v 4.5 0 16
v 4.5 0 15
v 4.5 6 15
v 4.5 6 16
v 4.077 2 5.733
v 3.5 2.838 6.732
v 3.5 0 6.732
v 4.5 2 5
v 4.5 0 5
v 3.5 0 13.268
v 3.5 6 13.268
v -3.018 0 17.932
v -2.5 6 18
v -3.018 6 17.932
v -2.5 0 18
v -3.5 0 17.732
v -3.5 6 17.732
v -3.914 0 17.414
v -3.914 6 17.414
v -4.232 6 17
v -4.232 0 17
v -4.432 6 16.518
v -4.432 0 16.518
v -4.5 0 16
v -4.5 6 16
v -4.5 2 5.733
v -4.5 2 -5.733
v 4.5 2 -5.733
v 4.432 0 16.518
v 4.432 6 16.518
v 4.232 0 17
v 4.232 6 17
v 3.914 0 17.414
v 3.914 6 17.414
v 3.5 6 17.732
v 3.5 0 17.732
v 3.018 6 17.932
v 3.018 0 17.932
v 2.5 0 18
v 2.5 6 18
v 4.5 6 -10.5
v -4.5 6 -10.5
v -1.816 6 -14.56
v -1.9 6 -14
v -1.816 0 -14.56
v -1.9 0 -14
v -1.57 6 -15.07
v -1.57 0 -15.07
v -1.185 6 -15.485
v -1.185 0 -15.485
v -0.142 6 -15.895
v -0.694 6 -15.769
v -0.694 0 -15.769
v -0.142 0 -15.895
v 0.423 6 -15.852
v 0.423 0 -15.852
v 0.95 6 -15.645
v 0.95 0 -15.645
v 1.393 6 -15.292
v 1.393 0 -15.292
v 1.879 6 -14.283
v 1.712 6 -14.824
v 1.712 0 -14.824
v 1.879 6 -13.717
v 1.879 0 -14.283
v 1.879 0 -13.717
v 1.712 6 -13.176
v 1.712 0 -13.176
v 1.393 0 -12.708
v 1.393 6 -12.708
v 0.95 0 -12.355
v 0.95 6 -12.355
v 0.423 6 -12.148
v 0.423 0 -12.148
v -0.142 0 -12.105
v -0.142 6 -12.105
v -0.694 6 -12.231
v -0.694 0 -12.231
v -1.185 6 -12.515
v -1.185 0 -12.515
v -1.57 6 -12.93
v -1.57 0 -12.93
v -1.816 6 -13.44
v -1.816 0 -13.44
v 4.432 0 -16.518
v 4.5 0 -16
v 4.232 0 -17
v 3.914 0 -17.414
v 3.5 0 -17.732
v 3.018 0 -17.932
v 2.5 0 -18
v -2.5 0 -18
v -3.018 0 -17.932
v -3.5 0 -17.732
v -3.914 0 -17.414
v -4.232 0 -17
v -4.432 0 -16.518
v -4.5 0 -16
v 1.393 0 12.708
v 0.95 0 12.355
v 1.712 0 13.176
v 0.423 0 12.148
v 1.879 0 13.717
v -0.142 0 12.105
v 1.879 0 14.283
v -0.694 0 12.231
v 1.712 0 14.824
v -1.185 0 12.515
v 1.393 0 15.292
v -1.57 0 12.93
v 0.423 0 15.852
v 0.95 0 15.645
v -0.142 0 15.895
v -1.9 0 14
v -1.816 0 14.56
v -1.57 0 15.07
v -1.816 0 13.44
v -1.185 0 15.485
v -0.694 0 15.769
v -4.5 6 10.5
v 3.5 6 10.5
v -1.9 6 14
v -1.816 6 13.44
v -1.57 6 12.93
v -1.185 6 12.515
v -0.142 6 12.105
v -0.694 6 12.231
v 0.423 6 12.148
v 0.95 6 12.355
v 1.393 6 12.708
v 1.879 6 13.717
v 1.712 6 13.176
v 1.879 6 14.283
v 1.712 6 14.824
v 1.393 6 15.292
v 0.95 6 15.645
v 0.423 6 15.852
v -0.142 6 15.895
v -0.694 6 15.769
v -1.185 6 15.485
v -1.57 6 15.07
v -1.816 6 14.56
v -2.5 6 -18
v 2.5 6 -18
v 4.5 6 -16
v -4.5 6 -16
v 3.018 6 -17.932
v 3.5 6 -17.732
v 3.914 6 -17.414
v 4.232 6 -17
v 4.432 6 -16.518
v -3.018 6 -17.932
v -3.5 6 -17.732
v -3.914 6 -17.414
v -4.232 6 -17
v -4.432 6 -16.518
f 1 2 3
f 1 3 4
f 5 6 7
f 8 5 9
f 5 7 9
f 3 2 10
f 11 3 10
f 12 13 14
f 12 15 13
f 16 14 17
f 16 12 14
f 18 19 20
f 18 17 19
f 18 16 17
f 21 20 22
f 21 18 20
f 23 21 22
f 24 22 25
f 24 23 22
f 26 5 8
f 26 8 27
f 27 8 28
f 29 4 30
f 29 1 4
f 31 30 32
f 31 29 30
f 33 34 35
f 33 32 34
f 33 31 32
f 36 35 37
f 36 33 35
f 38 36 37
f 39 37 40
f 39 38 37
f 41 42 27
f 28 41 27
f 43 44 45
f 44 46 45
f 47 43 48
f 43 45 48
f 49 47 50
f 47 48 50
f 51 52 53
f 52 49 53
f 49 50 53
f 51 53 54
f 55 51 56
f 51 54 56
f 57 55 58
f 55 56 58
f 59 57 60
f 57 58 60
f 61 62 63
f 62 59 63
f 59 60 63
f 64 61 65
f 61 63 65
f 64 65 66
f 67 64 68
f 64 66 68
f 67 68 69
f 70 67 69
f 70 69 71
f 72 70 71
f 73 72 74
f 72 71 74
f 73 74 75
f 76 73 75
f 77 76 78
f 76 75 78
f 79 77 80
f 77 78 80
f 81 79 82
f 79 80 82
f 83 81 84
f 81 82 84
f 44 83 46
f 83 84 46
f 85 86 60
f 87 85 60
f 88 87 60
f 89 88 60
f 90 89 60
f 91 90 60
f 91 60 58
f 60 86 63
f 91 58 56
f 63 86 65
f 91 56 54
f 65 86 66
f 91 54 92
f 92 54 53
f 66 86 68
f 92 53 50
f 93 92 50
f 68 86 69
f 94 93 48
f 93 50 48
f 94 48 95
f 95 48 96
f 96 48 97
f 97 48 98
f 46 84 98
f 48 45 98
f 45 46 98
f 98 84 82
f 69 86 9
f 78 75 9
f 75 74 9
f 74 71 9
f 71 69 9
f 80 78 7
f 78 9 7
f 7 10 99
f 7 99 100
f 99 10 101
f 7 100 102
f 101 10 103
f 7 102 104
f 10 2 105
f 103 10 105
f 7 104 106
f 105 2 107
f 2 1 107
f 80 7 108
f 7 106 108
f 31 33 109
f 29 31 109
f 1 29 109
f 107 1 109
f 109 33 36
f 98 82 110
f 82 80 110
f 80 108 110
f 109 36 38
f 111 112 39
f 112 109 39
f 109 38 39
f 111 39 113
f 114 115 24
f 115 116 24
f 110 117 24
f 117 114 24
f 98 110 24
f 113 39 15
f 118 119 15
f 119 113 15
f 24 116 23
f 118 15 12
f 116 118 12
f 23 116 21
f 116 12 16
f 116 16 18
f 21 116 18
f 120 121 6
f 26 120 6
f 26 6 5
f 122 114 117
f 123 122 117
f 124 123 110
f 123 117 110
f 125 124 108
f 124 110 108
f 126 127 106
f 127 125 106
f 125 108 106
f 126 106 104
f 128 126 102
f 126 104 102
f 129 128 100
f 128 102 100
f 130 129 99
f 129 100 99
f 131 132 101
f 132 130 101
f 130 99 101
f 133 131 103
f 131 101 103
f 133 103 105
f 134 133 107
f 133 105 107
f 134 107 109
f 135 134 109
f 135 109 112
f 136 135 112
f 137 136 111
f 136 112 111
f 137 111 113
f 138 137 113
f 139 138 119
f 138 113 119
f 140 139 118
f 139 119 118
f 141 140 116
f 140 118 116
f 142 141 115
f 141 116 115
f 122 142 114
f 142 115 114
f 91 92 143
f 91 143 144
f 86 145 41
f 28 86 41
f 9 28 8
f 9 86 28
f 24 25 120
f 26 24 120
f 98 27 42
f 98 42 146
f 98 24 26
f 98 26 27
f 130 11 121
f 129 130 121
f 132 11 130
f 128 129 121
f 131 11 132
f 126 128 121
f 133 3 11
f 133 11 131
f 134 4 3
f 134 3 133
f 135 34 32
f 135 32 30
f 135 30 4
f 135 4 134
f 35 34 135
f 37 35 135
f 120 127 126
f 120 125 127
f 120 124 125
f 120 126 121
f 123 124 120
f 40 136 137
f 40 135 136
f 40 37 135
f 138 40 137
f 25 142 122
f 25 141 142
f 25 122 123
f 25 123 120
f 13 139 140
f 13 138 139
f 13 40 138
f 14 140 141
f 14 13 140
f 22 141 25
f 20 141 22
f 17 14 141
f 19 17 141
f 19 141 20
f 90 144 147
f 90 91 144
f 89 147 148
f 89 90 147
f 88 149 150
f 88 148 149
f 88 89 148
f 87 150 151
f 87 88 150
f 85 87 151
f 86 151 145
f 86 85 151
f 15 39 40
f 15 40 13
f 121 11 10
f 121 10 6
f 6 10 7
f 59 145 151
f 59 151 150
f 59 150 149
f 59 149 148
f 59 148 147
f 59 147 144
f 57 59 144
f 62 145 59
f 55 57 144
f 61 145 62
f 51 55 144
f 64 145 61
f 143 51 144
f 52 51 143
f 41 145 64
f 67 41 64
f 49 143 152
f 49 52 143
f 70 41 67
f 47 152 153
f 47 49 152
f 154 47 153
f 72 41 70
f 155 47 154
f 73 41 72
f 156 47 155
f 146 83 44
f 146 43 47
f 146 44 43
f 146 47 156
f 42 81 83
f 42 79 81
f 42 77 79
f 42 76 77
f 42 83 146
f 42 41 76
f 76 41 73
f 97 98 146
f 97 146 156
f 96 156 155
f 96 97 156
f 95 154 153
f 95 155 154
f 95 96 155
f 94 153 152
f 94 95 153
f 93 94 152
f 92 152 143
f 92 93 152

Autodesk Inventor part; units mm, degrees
ref_plane "YZ Plane" through (0, 0, 0) normal (1, 0, 0) x (0, 1, 0)
ref_plane "XZ Plane" through (0, 0, 0) normal (0, 1, 0) x (-1, 0, 0)
ref_plane "XY Plane" through (0, 0, 0) normal (0, 0, 1) x (1, 0, 0)
sketch "Sketch1" plane through (0, 0, 0) normal (0, 1, 0) x (-1, 0, 0)
  line L0 (-2.5, 18) -> (2.5, 18)
  line L1 (4.5, 16) -> (4.5, -16)
  line L2 (2.5, -18) -> (-2.5, -18)
  line L3 (-4.5, -16) -> (-4.5, 16)
  line L4 (-4.5, 18) -> (4.5, -18) construction
  line L5 (4.5, 18) -> (-4.5, -18) construction
  circle A0 centre (0, 14) radius 1.9
  line L6 (0, 14) -> (0, -14) construction
  circle A1 centre (0, -14) radius 1.9
  arc A2 (4.5, 16) -> (2.5, 18) centre (2.5, 16) ccw
  arc A3 (2.5, -18) -> (4.5, -16) centre (2.5, -16) ccw
  arc A4 (-4.5, -16) -> (-2.5, -18) centre (-2.5, -16) ccw
  arc A5 (-2.5, 18) -> (-4.5, 16) centre (-2.5, 16) ccw
  point P0 (0, 0)
  point P1 (0, 0)
  dimension "d0" = 3.8
  dimension "d1" = 28
  dimension "d2" = 36
  dimension "d3" = 9
  dimension "d4" = 2
  dimension "d5" = 2
  dimension "d6" = 2
extrude "Extrusion1" add sketch "Sketch1" along normal blind 6
sketch "Sketch2" plane through (4.5, 0, 16) normal (1, 0, 0) x (0, 0, -1)
  line L0 (32, 6) -> (0, 6) construction
  line L1 (5.5, 6) -> (10.267, 2)
  line L2 (10.267, 2) -> (16, 2)
  line L3 (16, 0) -> (16, 6) construction
  line L4 (16, 2) -> (16, 6)
  line L5 (5.5, 6) -> (16, 6)
  line L6 (0, 0) -> (32, 0) projected
  line L7 (26.5, 6) -> (21.733, 2)
  line L8 (21.733, 2) -> (16, 2)
  line L9 (26.5, 6) -> (16, 6)
  dimension "d9" = 2
  dimension "d10" = 10.5
  dimension "d11" = 40
extrude "Extrusion2" cut sketch "Sketch2" against normal through all
sketch "Sketch3" plane through (0, 0, 0) normal (0, -1, 0) x (1, 0, 0)
  line L0 (4.5, 16) -> (4.5, -16) construction
  line L1 (4.5, 15) -> (3.5, 13.2679)
  line L2 (3.5, 13.2679) -> (3.5, 6.7321)
  line L3 (3.5, 6.7321) -> (4.5, 5)
  line L4 (4.5, 15) -> (4.5, 5)
  line L5 (-2.5, 18) -> (2.5, 18) projected
  point P0 (0, 0)
  dimension "d14" = 150
  dimension "d15" = 150
  dimension "d16" = 1
  dimension "d17" = 3
  dimension "d18" = 10
extrude "Extrusion3" cut sketch "Sketch3" against normal through all
properties part number "CH_01_0033_syringe_pump_nut_mount" material "ABS Plastic"
